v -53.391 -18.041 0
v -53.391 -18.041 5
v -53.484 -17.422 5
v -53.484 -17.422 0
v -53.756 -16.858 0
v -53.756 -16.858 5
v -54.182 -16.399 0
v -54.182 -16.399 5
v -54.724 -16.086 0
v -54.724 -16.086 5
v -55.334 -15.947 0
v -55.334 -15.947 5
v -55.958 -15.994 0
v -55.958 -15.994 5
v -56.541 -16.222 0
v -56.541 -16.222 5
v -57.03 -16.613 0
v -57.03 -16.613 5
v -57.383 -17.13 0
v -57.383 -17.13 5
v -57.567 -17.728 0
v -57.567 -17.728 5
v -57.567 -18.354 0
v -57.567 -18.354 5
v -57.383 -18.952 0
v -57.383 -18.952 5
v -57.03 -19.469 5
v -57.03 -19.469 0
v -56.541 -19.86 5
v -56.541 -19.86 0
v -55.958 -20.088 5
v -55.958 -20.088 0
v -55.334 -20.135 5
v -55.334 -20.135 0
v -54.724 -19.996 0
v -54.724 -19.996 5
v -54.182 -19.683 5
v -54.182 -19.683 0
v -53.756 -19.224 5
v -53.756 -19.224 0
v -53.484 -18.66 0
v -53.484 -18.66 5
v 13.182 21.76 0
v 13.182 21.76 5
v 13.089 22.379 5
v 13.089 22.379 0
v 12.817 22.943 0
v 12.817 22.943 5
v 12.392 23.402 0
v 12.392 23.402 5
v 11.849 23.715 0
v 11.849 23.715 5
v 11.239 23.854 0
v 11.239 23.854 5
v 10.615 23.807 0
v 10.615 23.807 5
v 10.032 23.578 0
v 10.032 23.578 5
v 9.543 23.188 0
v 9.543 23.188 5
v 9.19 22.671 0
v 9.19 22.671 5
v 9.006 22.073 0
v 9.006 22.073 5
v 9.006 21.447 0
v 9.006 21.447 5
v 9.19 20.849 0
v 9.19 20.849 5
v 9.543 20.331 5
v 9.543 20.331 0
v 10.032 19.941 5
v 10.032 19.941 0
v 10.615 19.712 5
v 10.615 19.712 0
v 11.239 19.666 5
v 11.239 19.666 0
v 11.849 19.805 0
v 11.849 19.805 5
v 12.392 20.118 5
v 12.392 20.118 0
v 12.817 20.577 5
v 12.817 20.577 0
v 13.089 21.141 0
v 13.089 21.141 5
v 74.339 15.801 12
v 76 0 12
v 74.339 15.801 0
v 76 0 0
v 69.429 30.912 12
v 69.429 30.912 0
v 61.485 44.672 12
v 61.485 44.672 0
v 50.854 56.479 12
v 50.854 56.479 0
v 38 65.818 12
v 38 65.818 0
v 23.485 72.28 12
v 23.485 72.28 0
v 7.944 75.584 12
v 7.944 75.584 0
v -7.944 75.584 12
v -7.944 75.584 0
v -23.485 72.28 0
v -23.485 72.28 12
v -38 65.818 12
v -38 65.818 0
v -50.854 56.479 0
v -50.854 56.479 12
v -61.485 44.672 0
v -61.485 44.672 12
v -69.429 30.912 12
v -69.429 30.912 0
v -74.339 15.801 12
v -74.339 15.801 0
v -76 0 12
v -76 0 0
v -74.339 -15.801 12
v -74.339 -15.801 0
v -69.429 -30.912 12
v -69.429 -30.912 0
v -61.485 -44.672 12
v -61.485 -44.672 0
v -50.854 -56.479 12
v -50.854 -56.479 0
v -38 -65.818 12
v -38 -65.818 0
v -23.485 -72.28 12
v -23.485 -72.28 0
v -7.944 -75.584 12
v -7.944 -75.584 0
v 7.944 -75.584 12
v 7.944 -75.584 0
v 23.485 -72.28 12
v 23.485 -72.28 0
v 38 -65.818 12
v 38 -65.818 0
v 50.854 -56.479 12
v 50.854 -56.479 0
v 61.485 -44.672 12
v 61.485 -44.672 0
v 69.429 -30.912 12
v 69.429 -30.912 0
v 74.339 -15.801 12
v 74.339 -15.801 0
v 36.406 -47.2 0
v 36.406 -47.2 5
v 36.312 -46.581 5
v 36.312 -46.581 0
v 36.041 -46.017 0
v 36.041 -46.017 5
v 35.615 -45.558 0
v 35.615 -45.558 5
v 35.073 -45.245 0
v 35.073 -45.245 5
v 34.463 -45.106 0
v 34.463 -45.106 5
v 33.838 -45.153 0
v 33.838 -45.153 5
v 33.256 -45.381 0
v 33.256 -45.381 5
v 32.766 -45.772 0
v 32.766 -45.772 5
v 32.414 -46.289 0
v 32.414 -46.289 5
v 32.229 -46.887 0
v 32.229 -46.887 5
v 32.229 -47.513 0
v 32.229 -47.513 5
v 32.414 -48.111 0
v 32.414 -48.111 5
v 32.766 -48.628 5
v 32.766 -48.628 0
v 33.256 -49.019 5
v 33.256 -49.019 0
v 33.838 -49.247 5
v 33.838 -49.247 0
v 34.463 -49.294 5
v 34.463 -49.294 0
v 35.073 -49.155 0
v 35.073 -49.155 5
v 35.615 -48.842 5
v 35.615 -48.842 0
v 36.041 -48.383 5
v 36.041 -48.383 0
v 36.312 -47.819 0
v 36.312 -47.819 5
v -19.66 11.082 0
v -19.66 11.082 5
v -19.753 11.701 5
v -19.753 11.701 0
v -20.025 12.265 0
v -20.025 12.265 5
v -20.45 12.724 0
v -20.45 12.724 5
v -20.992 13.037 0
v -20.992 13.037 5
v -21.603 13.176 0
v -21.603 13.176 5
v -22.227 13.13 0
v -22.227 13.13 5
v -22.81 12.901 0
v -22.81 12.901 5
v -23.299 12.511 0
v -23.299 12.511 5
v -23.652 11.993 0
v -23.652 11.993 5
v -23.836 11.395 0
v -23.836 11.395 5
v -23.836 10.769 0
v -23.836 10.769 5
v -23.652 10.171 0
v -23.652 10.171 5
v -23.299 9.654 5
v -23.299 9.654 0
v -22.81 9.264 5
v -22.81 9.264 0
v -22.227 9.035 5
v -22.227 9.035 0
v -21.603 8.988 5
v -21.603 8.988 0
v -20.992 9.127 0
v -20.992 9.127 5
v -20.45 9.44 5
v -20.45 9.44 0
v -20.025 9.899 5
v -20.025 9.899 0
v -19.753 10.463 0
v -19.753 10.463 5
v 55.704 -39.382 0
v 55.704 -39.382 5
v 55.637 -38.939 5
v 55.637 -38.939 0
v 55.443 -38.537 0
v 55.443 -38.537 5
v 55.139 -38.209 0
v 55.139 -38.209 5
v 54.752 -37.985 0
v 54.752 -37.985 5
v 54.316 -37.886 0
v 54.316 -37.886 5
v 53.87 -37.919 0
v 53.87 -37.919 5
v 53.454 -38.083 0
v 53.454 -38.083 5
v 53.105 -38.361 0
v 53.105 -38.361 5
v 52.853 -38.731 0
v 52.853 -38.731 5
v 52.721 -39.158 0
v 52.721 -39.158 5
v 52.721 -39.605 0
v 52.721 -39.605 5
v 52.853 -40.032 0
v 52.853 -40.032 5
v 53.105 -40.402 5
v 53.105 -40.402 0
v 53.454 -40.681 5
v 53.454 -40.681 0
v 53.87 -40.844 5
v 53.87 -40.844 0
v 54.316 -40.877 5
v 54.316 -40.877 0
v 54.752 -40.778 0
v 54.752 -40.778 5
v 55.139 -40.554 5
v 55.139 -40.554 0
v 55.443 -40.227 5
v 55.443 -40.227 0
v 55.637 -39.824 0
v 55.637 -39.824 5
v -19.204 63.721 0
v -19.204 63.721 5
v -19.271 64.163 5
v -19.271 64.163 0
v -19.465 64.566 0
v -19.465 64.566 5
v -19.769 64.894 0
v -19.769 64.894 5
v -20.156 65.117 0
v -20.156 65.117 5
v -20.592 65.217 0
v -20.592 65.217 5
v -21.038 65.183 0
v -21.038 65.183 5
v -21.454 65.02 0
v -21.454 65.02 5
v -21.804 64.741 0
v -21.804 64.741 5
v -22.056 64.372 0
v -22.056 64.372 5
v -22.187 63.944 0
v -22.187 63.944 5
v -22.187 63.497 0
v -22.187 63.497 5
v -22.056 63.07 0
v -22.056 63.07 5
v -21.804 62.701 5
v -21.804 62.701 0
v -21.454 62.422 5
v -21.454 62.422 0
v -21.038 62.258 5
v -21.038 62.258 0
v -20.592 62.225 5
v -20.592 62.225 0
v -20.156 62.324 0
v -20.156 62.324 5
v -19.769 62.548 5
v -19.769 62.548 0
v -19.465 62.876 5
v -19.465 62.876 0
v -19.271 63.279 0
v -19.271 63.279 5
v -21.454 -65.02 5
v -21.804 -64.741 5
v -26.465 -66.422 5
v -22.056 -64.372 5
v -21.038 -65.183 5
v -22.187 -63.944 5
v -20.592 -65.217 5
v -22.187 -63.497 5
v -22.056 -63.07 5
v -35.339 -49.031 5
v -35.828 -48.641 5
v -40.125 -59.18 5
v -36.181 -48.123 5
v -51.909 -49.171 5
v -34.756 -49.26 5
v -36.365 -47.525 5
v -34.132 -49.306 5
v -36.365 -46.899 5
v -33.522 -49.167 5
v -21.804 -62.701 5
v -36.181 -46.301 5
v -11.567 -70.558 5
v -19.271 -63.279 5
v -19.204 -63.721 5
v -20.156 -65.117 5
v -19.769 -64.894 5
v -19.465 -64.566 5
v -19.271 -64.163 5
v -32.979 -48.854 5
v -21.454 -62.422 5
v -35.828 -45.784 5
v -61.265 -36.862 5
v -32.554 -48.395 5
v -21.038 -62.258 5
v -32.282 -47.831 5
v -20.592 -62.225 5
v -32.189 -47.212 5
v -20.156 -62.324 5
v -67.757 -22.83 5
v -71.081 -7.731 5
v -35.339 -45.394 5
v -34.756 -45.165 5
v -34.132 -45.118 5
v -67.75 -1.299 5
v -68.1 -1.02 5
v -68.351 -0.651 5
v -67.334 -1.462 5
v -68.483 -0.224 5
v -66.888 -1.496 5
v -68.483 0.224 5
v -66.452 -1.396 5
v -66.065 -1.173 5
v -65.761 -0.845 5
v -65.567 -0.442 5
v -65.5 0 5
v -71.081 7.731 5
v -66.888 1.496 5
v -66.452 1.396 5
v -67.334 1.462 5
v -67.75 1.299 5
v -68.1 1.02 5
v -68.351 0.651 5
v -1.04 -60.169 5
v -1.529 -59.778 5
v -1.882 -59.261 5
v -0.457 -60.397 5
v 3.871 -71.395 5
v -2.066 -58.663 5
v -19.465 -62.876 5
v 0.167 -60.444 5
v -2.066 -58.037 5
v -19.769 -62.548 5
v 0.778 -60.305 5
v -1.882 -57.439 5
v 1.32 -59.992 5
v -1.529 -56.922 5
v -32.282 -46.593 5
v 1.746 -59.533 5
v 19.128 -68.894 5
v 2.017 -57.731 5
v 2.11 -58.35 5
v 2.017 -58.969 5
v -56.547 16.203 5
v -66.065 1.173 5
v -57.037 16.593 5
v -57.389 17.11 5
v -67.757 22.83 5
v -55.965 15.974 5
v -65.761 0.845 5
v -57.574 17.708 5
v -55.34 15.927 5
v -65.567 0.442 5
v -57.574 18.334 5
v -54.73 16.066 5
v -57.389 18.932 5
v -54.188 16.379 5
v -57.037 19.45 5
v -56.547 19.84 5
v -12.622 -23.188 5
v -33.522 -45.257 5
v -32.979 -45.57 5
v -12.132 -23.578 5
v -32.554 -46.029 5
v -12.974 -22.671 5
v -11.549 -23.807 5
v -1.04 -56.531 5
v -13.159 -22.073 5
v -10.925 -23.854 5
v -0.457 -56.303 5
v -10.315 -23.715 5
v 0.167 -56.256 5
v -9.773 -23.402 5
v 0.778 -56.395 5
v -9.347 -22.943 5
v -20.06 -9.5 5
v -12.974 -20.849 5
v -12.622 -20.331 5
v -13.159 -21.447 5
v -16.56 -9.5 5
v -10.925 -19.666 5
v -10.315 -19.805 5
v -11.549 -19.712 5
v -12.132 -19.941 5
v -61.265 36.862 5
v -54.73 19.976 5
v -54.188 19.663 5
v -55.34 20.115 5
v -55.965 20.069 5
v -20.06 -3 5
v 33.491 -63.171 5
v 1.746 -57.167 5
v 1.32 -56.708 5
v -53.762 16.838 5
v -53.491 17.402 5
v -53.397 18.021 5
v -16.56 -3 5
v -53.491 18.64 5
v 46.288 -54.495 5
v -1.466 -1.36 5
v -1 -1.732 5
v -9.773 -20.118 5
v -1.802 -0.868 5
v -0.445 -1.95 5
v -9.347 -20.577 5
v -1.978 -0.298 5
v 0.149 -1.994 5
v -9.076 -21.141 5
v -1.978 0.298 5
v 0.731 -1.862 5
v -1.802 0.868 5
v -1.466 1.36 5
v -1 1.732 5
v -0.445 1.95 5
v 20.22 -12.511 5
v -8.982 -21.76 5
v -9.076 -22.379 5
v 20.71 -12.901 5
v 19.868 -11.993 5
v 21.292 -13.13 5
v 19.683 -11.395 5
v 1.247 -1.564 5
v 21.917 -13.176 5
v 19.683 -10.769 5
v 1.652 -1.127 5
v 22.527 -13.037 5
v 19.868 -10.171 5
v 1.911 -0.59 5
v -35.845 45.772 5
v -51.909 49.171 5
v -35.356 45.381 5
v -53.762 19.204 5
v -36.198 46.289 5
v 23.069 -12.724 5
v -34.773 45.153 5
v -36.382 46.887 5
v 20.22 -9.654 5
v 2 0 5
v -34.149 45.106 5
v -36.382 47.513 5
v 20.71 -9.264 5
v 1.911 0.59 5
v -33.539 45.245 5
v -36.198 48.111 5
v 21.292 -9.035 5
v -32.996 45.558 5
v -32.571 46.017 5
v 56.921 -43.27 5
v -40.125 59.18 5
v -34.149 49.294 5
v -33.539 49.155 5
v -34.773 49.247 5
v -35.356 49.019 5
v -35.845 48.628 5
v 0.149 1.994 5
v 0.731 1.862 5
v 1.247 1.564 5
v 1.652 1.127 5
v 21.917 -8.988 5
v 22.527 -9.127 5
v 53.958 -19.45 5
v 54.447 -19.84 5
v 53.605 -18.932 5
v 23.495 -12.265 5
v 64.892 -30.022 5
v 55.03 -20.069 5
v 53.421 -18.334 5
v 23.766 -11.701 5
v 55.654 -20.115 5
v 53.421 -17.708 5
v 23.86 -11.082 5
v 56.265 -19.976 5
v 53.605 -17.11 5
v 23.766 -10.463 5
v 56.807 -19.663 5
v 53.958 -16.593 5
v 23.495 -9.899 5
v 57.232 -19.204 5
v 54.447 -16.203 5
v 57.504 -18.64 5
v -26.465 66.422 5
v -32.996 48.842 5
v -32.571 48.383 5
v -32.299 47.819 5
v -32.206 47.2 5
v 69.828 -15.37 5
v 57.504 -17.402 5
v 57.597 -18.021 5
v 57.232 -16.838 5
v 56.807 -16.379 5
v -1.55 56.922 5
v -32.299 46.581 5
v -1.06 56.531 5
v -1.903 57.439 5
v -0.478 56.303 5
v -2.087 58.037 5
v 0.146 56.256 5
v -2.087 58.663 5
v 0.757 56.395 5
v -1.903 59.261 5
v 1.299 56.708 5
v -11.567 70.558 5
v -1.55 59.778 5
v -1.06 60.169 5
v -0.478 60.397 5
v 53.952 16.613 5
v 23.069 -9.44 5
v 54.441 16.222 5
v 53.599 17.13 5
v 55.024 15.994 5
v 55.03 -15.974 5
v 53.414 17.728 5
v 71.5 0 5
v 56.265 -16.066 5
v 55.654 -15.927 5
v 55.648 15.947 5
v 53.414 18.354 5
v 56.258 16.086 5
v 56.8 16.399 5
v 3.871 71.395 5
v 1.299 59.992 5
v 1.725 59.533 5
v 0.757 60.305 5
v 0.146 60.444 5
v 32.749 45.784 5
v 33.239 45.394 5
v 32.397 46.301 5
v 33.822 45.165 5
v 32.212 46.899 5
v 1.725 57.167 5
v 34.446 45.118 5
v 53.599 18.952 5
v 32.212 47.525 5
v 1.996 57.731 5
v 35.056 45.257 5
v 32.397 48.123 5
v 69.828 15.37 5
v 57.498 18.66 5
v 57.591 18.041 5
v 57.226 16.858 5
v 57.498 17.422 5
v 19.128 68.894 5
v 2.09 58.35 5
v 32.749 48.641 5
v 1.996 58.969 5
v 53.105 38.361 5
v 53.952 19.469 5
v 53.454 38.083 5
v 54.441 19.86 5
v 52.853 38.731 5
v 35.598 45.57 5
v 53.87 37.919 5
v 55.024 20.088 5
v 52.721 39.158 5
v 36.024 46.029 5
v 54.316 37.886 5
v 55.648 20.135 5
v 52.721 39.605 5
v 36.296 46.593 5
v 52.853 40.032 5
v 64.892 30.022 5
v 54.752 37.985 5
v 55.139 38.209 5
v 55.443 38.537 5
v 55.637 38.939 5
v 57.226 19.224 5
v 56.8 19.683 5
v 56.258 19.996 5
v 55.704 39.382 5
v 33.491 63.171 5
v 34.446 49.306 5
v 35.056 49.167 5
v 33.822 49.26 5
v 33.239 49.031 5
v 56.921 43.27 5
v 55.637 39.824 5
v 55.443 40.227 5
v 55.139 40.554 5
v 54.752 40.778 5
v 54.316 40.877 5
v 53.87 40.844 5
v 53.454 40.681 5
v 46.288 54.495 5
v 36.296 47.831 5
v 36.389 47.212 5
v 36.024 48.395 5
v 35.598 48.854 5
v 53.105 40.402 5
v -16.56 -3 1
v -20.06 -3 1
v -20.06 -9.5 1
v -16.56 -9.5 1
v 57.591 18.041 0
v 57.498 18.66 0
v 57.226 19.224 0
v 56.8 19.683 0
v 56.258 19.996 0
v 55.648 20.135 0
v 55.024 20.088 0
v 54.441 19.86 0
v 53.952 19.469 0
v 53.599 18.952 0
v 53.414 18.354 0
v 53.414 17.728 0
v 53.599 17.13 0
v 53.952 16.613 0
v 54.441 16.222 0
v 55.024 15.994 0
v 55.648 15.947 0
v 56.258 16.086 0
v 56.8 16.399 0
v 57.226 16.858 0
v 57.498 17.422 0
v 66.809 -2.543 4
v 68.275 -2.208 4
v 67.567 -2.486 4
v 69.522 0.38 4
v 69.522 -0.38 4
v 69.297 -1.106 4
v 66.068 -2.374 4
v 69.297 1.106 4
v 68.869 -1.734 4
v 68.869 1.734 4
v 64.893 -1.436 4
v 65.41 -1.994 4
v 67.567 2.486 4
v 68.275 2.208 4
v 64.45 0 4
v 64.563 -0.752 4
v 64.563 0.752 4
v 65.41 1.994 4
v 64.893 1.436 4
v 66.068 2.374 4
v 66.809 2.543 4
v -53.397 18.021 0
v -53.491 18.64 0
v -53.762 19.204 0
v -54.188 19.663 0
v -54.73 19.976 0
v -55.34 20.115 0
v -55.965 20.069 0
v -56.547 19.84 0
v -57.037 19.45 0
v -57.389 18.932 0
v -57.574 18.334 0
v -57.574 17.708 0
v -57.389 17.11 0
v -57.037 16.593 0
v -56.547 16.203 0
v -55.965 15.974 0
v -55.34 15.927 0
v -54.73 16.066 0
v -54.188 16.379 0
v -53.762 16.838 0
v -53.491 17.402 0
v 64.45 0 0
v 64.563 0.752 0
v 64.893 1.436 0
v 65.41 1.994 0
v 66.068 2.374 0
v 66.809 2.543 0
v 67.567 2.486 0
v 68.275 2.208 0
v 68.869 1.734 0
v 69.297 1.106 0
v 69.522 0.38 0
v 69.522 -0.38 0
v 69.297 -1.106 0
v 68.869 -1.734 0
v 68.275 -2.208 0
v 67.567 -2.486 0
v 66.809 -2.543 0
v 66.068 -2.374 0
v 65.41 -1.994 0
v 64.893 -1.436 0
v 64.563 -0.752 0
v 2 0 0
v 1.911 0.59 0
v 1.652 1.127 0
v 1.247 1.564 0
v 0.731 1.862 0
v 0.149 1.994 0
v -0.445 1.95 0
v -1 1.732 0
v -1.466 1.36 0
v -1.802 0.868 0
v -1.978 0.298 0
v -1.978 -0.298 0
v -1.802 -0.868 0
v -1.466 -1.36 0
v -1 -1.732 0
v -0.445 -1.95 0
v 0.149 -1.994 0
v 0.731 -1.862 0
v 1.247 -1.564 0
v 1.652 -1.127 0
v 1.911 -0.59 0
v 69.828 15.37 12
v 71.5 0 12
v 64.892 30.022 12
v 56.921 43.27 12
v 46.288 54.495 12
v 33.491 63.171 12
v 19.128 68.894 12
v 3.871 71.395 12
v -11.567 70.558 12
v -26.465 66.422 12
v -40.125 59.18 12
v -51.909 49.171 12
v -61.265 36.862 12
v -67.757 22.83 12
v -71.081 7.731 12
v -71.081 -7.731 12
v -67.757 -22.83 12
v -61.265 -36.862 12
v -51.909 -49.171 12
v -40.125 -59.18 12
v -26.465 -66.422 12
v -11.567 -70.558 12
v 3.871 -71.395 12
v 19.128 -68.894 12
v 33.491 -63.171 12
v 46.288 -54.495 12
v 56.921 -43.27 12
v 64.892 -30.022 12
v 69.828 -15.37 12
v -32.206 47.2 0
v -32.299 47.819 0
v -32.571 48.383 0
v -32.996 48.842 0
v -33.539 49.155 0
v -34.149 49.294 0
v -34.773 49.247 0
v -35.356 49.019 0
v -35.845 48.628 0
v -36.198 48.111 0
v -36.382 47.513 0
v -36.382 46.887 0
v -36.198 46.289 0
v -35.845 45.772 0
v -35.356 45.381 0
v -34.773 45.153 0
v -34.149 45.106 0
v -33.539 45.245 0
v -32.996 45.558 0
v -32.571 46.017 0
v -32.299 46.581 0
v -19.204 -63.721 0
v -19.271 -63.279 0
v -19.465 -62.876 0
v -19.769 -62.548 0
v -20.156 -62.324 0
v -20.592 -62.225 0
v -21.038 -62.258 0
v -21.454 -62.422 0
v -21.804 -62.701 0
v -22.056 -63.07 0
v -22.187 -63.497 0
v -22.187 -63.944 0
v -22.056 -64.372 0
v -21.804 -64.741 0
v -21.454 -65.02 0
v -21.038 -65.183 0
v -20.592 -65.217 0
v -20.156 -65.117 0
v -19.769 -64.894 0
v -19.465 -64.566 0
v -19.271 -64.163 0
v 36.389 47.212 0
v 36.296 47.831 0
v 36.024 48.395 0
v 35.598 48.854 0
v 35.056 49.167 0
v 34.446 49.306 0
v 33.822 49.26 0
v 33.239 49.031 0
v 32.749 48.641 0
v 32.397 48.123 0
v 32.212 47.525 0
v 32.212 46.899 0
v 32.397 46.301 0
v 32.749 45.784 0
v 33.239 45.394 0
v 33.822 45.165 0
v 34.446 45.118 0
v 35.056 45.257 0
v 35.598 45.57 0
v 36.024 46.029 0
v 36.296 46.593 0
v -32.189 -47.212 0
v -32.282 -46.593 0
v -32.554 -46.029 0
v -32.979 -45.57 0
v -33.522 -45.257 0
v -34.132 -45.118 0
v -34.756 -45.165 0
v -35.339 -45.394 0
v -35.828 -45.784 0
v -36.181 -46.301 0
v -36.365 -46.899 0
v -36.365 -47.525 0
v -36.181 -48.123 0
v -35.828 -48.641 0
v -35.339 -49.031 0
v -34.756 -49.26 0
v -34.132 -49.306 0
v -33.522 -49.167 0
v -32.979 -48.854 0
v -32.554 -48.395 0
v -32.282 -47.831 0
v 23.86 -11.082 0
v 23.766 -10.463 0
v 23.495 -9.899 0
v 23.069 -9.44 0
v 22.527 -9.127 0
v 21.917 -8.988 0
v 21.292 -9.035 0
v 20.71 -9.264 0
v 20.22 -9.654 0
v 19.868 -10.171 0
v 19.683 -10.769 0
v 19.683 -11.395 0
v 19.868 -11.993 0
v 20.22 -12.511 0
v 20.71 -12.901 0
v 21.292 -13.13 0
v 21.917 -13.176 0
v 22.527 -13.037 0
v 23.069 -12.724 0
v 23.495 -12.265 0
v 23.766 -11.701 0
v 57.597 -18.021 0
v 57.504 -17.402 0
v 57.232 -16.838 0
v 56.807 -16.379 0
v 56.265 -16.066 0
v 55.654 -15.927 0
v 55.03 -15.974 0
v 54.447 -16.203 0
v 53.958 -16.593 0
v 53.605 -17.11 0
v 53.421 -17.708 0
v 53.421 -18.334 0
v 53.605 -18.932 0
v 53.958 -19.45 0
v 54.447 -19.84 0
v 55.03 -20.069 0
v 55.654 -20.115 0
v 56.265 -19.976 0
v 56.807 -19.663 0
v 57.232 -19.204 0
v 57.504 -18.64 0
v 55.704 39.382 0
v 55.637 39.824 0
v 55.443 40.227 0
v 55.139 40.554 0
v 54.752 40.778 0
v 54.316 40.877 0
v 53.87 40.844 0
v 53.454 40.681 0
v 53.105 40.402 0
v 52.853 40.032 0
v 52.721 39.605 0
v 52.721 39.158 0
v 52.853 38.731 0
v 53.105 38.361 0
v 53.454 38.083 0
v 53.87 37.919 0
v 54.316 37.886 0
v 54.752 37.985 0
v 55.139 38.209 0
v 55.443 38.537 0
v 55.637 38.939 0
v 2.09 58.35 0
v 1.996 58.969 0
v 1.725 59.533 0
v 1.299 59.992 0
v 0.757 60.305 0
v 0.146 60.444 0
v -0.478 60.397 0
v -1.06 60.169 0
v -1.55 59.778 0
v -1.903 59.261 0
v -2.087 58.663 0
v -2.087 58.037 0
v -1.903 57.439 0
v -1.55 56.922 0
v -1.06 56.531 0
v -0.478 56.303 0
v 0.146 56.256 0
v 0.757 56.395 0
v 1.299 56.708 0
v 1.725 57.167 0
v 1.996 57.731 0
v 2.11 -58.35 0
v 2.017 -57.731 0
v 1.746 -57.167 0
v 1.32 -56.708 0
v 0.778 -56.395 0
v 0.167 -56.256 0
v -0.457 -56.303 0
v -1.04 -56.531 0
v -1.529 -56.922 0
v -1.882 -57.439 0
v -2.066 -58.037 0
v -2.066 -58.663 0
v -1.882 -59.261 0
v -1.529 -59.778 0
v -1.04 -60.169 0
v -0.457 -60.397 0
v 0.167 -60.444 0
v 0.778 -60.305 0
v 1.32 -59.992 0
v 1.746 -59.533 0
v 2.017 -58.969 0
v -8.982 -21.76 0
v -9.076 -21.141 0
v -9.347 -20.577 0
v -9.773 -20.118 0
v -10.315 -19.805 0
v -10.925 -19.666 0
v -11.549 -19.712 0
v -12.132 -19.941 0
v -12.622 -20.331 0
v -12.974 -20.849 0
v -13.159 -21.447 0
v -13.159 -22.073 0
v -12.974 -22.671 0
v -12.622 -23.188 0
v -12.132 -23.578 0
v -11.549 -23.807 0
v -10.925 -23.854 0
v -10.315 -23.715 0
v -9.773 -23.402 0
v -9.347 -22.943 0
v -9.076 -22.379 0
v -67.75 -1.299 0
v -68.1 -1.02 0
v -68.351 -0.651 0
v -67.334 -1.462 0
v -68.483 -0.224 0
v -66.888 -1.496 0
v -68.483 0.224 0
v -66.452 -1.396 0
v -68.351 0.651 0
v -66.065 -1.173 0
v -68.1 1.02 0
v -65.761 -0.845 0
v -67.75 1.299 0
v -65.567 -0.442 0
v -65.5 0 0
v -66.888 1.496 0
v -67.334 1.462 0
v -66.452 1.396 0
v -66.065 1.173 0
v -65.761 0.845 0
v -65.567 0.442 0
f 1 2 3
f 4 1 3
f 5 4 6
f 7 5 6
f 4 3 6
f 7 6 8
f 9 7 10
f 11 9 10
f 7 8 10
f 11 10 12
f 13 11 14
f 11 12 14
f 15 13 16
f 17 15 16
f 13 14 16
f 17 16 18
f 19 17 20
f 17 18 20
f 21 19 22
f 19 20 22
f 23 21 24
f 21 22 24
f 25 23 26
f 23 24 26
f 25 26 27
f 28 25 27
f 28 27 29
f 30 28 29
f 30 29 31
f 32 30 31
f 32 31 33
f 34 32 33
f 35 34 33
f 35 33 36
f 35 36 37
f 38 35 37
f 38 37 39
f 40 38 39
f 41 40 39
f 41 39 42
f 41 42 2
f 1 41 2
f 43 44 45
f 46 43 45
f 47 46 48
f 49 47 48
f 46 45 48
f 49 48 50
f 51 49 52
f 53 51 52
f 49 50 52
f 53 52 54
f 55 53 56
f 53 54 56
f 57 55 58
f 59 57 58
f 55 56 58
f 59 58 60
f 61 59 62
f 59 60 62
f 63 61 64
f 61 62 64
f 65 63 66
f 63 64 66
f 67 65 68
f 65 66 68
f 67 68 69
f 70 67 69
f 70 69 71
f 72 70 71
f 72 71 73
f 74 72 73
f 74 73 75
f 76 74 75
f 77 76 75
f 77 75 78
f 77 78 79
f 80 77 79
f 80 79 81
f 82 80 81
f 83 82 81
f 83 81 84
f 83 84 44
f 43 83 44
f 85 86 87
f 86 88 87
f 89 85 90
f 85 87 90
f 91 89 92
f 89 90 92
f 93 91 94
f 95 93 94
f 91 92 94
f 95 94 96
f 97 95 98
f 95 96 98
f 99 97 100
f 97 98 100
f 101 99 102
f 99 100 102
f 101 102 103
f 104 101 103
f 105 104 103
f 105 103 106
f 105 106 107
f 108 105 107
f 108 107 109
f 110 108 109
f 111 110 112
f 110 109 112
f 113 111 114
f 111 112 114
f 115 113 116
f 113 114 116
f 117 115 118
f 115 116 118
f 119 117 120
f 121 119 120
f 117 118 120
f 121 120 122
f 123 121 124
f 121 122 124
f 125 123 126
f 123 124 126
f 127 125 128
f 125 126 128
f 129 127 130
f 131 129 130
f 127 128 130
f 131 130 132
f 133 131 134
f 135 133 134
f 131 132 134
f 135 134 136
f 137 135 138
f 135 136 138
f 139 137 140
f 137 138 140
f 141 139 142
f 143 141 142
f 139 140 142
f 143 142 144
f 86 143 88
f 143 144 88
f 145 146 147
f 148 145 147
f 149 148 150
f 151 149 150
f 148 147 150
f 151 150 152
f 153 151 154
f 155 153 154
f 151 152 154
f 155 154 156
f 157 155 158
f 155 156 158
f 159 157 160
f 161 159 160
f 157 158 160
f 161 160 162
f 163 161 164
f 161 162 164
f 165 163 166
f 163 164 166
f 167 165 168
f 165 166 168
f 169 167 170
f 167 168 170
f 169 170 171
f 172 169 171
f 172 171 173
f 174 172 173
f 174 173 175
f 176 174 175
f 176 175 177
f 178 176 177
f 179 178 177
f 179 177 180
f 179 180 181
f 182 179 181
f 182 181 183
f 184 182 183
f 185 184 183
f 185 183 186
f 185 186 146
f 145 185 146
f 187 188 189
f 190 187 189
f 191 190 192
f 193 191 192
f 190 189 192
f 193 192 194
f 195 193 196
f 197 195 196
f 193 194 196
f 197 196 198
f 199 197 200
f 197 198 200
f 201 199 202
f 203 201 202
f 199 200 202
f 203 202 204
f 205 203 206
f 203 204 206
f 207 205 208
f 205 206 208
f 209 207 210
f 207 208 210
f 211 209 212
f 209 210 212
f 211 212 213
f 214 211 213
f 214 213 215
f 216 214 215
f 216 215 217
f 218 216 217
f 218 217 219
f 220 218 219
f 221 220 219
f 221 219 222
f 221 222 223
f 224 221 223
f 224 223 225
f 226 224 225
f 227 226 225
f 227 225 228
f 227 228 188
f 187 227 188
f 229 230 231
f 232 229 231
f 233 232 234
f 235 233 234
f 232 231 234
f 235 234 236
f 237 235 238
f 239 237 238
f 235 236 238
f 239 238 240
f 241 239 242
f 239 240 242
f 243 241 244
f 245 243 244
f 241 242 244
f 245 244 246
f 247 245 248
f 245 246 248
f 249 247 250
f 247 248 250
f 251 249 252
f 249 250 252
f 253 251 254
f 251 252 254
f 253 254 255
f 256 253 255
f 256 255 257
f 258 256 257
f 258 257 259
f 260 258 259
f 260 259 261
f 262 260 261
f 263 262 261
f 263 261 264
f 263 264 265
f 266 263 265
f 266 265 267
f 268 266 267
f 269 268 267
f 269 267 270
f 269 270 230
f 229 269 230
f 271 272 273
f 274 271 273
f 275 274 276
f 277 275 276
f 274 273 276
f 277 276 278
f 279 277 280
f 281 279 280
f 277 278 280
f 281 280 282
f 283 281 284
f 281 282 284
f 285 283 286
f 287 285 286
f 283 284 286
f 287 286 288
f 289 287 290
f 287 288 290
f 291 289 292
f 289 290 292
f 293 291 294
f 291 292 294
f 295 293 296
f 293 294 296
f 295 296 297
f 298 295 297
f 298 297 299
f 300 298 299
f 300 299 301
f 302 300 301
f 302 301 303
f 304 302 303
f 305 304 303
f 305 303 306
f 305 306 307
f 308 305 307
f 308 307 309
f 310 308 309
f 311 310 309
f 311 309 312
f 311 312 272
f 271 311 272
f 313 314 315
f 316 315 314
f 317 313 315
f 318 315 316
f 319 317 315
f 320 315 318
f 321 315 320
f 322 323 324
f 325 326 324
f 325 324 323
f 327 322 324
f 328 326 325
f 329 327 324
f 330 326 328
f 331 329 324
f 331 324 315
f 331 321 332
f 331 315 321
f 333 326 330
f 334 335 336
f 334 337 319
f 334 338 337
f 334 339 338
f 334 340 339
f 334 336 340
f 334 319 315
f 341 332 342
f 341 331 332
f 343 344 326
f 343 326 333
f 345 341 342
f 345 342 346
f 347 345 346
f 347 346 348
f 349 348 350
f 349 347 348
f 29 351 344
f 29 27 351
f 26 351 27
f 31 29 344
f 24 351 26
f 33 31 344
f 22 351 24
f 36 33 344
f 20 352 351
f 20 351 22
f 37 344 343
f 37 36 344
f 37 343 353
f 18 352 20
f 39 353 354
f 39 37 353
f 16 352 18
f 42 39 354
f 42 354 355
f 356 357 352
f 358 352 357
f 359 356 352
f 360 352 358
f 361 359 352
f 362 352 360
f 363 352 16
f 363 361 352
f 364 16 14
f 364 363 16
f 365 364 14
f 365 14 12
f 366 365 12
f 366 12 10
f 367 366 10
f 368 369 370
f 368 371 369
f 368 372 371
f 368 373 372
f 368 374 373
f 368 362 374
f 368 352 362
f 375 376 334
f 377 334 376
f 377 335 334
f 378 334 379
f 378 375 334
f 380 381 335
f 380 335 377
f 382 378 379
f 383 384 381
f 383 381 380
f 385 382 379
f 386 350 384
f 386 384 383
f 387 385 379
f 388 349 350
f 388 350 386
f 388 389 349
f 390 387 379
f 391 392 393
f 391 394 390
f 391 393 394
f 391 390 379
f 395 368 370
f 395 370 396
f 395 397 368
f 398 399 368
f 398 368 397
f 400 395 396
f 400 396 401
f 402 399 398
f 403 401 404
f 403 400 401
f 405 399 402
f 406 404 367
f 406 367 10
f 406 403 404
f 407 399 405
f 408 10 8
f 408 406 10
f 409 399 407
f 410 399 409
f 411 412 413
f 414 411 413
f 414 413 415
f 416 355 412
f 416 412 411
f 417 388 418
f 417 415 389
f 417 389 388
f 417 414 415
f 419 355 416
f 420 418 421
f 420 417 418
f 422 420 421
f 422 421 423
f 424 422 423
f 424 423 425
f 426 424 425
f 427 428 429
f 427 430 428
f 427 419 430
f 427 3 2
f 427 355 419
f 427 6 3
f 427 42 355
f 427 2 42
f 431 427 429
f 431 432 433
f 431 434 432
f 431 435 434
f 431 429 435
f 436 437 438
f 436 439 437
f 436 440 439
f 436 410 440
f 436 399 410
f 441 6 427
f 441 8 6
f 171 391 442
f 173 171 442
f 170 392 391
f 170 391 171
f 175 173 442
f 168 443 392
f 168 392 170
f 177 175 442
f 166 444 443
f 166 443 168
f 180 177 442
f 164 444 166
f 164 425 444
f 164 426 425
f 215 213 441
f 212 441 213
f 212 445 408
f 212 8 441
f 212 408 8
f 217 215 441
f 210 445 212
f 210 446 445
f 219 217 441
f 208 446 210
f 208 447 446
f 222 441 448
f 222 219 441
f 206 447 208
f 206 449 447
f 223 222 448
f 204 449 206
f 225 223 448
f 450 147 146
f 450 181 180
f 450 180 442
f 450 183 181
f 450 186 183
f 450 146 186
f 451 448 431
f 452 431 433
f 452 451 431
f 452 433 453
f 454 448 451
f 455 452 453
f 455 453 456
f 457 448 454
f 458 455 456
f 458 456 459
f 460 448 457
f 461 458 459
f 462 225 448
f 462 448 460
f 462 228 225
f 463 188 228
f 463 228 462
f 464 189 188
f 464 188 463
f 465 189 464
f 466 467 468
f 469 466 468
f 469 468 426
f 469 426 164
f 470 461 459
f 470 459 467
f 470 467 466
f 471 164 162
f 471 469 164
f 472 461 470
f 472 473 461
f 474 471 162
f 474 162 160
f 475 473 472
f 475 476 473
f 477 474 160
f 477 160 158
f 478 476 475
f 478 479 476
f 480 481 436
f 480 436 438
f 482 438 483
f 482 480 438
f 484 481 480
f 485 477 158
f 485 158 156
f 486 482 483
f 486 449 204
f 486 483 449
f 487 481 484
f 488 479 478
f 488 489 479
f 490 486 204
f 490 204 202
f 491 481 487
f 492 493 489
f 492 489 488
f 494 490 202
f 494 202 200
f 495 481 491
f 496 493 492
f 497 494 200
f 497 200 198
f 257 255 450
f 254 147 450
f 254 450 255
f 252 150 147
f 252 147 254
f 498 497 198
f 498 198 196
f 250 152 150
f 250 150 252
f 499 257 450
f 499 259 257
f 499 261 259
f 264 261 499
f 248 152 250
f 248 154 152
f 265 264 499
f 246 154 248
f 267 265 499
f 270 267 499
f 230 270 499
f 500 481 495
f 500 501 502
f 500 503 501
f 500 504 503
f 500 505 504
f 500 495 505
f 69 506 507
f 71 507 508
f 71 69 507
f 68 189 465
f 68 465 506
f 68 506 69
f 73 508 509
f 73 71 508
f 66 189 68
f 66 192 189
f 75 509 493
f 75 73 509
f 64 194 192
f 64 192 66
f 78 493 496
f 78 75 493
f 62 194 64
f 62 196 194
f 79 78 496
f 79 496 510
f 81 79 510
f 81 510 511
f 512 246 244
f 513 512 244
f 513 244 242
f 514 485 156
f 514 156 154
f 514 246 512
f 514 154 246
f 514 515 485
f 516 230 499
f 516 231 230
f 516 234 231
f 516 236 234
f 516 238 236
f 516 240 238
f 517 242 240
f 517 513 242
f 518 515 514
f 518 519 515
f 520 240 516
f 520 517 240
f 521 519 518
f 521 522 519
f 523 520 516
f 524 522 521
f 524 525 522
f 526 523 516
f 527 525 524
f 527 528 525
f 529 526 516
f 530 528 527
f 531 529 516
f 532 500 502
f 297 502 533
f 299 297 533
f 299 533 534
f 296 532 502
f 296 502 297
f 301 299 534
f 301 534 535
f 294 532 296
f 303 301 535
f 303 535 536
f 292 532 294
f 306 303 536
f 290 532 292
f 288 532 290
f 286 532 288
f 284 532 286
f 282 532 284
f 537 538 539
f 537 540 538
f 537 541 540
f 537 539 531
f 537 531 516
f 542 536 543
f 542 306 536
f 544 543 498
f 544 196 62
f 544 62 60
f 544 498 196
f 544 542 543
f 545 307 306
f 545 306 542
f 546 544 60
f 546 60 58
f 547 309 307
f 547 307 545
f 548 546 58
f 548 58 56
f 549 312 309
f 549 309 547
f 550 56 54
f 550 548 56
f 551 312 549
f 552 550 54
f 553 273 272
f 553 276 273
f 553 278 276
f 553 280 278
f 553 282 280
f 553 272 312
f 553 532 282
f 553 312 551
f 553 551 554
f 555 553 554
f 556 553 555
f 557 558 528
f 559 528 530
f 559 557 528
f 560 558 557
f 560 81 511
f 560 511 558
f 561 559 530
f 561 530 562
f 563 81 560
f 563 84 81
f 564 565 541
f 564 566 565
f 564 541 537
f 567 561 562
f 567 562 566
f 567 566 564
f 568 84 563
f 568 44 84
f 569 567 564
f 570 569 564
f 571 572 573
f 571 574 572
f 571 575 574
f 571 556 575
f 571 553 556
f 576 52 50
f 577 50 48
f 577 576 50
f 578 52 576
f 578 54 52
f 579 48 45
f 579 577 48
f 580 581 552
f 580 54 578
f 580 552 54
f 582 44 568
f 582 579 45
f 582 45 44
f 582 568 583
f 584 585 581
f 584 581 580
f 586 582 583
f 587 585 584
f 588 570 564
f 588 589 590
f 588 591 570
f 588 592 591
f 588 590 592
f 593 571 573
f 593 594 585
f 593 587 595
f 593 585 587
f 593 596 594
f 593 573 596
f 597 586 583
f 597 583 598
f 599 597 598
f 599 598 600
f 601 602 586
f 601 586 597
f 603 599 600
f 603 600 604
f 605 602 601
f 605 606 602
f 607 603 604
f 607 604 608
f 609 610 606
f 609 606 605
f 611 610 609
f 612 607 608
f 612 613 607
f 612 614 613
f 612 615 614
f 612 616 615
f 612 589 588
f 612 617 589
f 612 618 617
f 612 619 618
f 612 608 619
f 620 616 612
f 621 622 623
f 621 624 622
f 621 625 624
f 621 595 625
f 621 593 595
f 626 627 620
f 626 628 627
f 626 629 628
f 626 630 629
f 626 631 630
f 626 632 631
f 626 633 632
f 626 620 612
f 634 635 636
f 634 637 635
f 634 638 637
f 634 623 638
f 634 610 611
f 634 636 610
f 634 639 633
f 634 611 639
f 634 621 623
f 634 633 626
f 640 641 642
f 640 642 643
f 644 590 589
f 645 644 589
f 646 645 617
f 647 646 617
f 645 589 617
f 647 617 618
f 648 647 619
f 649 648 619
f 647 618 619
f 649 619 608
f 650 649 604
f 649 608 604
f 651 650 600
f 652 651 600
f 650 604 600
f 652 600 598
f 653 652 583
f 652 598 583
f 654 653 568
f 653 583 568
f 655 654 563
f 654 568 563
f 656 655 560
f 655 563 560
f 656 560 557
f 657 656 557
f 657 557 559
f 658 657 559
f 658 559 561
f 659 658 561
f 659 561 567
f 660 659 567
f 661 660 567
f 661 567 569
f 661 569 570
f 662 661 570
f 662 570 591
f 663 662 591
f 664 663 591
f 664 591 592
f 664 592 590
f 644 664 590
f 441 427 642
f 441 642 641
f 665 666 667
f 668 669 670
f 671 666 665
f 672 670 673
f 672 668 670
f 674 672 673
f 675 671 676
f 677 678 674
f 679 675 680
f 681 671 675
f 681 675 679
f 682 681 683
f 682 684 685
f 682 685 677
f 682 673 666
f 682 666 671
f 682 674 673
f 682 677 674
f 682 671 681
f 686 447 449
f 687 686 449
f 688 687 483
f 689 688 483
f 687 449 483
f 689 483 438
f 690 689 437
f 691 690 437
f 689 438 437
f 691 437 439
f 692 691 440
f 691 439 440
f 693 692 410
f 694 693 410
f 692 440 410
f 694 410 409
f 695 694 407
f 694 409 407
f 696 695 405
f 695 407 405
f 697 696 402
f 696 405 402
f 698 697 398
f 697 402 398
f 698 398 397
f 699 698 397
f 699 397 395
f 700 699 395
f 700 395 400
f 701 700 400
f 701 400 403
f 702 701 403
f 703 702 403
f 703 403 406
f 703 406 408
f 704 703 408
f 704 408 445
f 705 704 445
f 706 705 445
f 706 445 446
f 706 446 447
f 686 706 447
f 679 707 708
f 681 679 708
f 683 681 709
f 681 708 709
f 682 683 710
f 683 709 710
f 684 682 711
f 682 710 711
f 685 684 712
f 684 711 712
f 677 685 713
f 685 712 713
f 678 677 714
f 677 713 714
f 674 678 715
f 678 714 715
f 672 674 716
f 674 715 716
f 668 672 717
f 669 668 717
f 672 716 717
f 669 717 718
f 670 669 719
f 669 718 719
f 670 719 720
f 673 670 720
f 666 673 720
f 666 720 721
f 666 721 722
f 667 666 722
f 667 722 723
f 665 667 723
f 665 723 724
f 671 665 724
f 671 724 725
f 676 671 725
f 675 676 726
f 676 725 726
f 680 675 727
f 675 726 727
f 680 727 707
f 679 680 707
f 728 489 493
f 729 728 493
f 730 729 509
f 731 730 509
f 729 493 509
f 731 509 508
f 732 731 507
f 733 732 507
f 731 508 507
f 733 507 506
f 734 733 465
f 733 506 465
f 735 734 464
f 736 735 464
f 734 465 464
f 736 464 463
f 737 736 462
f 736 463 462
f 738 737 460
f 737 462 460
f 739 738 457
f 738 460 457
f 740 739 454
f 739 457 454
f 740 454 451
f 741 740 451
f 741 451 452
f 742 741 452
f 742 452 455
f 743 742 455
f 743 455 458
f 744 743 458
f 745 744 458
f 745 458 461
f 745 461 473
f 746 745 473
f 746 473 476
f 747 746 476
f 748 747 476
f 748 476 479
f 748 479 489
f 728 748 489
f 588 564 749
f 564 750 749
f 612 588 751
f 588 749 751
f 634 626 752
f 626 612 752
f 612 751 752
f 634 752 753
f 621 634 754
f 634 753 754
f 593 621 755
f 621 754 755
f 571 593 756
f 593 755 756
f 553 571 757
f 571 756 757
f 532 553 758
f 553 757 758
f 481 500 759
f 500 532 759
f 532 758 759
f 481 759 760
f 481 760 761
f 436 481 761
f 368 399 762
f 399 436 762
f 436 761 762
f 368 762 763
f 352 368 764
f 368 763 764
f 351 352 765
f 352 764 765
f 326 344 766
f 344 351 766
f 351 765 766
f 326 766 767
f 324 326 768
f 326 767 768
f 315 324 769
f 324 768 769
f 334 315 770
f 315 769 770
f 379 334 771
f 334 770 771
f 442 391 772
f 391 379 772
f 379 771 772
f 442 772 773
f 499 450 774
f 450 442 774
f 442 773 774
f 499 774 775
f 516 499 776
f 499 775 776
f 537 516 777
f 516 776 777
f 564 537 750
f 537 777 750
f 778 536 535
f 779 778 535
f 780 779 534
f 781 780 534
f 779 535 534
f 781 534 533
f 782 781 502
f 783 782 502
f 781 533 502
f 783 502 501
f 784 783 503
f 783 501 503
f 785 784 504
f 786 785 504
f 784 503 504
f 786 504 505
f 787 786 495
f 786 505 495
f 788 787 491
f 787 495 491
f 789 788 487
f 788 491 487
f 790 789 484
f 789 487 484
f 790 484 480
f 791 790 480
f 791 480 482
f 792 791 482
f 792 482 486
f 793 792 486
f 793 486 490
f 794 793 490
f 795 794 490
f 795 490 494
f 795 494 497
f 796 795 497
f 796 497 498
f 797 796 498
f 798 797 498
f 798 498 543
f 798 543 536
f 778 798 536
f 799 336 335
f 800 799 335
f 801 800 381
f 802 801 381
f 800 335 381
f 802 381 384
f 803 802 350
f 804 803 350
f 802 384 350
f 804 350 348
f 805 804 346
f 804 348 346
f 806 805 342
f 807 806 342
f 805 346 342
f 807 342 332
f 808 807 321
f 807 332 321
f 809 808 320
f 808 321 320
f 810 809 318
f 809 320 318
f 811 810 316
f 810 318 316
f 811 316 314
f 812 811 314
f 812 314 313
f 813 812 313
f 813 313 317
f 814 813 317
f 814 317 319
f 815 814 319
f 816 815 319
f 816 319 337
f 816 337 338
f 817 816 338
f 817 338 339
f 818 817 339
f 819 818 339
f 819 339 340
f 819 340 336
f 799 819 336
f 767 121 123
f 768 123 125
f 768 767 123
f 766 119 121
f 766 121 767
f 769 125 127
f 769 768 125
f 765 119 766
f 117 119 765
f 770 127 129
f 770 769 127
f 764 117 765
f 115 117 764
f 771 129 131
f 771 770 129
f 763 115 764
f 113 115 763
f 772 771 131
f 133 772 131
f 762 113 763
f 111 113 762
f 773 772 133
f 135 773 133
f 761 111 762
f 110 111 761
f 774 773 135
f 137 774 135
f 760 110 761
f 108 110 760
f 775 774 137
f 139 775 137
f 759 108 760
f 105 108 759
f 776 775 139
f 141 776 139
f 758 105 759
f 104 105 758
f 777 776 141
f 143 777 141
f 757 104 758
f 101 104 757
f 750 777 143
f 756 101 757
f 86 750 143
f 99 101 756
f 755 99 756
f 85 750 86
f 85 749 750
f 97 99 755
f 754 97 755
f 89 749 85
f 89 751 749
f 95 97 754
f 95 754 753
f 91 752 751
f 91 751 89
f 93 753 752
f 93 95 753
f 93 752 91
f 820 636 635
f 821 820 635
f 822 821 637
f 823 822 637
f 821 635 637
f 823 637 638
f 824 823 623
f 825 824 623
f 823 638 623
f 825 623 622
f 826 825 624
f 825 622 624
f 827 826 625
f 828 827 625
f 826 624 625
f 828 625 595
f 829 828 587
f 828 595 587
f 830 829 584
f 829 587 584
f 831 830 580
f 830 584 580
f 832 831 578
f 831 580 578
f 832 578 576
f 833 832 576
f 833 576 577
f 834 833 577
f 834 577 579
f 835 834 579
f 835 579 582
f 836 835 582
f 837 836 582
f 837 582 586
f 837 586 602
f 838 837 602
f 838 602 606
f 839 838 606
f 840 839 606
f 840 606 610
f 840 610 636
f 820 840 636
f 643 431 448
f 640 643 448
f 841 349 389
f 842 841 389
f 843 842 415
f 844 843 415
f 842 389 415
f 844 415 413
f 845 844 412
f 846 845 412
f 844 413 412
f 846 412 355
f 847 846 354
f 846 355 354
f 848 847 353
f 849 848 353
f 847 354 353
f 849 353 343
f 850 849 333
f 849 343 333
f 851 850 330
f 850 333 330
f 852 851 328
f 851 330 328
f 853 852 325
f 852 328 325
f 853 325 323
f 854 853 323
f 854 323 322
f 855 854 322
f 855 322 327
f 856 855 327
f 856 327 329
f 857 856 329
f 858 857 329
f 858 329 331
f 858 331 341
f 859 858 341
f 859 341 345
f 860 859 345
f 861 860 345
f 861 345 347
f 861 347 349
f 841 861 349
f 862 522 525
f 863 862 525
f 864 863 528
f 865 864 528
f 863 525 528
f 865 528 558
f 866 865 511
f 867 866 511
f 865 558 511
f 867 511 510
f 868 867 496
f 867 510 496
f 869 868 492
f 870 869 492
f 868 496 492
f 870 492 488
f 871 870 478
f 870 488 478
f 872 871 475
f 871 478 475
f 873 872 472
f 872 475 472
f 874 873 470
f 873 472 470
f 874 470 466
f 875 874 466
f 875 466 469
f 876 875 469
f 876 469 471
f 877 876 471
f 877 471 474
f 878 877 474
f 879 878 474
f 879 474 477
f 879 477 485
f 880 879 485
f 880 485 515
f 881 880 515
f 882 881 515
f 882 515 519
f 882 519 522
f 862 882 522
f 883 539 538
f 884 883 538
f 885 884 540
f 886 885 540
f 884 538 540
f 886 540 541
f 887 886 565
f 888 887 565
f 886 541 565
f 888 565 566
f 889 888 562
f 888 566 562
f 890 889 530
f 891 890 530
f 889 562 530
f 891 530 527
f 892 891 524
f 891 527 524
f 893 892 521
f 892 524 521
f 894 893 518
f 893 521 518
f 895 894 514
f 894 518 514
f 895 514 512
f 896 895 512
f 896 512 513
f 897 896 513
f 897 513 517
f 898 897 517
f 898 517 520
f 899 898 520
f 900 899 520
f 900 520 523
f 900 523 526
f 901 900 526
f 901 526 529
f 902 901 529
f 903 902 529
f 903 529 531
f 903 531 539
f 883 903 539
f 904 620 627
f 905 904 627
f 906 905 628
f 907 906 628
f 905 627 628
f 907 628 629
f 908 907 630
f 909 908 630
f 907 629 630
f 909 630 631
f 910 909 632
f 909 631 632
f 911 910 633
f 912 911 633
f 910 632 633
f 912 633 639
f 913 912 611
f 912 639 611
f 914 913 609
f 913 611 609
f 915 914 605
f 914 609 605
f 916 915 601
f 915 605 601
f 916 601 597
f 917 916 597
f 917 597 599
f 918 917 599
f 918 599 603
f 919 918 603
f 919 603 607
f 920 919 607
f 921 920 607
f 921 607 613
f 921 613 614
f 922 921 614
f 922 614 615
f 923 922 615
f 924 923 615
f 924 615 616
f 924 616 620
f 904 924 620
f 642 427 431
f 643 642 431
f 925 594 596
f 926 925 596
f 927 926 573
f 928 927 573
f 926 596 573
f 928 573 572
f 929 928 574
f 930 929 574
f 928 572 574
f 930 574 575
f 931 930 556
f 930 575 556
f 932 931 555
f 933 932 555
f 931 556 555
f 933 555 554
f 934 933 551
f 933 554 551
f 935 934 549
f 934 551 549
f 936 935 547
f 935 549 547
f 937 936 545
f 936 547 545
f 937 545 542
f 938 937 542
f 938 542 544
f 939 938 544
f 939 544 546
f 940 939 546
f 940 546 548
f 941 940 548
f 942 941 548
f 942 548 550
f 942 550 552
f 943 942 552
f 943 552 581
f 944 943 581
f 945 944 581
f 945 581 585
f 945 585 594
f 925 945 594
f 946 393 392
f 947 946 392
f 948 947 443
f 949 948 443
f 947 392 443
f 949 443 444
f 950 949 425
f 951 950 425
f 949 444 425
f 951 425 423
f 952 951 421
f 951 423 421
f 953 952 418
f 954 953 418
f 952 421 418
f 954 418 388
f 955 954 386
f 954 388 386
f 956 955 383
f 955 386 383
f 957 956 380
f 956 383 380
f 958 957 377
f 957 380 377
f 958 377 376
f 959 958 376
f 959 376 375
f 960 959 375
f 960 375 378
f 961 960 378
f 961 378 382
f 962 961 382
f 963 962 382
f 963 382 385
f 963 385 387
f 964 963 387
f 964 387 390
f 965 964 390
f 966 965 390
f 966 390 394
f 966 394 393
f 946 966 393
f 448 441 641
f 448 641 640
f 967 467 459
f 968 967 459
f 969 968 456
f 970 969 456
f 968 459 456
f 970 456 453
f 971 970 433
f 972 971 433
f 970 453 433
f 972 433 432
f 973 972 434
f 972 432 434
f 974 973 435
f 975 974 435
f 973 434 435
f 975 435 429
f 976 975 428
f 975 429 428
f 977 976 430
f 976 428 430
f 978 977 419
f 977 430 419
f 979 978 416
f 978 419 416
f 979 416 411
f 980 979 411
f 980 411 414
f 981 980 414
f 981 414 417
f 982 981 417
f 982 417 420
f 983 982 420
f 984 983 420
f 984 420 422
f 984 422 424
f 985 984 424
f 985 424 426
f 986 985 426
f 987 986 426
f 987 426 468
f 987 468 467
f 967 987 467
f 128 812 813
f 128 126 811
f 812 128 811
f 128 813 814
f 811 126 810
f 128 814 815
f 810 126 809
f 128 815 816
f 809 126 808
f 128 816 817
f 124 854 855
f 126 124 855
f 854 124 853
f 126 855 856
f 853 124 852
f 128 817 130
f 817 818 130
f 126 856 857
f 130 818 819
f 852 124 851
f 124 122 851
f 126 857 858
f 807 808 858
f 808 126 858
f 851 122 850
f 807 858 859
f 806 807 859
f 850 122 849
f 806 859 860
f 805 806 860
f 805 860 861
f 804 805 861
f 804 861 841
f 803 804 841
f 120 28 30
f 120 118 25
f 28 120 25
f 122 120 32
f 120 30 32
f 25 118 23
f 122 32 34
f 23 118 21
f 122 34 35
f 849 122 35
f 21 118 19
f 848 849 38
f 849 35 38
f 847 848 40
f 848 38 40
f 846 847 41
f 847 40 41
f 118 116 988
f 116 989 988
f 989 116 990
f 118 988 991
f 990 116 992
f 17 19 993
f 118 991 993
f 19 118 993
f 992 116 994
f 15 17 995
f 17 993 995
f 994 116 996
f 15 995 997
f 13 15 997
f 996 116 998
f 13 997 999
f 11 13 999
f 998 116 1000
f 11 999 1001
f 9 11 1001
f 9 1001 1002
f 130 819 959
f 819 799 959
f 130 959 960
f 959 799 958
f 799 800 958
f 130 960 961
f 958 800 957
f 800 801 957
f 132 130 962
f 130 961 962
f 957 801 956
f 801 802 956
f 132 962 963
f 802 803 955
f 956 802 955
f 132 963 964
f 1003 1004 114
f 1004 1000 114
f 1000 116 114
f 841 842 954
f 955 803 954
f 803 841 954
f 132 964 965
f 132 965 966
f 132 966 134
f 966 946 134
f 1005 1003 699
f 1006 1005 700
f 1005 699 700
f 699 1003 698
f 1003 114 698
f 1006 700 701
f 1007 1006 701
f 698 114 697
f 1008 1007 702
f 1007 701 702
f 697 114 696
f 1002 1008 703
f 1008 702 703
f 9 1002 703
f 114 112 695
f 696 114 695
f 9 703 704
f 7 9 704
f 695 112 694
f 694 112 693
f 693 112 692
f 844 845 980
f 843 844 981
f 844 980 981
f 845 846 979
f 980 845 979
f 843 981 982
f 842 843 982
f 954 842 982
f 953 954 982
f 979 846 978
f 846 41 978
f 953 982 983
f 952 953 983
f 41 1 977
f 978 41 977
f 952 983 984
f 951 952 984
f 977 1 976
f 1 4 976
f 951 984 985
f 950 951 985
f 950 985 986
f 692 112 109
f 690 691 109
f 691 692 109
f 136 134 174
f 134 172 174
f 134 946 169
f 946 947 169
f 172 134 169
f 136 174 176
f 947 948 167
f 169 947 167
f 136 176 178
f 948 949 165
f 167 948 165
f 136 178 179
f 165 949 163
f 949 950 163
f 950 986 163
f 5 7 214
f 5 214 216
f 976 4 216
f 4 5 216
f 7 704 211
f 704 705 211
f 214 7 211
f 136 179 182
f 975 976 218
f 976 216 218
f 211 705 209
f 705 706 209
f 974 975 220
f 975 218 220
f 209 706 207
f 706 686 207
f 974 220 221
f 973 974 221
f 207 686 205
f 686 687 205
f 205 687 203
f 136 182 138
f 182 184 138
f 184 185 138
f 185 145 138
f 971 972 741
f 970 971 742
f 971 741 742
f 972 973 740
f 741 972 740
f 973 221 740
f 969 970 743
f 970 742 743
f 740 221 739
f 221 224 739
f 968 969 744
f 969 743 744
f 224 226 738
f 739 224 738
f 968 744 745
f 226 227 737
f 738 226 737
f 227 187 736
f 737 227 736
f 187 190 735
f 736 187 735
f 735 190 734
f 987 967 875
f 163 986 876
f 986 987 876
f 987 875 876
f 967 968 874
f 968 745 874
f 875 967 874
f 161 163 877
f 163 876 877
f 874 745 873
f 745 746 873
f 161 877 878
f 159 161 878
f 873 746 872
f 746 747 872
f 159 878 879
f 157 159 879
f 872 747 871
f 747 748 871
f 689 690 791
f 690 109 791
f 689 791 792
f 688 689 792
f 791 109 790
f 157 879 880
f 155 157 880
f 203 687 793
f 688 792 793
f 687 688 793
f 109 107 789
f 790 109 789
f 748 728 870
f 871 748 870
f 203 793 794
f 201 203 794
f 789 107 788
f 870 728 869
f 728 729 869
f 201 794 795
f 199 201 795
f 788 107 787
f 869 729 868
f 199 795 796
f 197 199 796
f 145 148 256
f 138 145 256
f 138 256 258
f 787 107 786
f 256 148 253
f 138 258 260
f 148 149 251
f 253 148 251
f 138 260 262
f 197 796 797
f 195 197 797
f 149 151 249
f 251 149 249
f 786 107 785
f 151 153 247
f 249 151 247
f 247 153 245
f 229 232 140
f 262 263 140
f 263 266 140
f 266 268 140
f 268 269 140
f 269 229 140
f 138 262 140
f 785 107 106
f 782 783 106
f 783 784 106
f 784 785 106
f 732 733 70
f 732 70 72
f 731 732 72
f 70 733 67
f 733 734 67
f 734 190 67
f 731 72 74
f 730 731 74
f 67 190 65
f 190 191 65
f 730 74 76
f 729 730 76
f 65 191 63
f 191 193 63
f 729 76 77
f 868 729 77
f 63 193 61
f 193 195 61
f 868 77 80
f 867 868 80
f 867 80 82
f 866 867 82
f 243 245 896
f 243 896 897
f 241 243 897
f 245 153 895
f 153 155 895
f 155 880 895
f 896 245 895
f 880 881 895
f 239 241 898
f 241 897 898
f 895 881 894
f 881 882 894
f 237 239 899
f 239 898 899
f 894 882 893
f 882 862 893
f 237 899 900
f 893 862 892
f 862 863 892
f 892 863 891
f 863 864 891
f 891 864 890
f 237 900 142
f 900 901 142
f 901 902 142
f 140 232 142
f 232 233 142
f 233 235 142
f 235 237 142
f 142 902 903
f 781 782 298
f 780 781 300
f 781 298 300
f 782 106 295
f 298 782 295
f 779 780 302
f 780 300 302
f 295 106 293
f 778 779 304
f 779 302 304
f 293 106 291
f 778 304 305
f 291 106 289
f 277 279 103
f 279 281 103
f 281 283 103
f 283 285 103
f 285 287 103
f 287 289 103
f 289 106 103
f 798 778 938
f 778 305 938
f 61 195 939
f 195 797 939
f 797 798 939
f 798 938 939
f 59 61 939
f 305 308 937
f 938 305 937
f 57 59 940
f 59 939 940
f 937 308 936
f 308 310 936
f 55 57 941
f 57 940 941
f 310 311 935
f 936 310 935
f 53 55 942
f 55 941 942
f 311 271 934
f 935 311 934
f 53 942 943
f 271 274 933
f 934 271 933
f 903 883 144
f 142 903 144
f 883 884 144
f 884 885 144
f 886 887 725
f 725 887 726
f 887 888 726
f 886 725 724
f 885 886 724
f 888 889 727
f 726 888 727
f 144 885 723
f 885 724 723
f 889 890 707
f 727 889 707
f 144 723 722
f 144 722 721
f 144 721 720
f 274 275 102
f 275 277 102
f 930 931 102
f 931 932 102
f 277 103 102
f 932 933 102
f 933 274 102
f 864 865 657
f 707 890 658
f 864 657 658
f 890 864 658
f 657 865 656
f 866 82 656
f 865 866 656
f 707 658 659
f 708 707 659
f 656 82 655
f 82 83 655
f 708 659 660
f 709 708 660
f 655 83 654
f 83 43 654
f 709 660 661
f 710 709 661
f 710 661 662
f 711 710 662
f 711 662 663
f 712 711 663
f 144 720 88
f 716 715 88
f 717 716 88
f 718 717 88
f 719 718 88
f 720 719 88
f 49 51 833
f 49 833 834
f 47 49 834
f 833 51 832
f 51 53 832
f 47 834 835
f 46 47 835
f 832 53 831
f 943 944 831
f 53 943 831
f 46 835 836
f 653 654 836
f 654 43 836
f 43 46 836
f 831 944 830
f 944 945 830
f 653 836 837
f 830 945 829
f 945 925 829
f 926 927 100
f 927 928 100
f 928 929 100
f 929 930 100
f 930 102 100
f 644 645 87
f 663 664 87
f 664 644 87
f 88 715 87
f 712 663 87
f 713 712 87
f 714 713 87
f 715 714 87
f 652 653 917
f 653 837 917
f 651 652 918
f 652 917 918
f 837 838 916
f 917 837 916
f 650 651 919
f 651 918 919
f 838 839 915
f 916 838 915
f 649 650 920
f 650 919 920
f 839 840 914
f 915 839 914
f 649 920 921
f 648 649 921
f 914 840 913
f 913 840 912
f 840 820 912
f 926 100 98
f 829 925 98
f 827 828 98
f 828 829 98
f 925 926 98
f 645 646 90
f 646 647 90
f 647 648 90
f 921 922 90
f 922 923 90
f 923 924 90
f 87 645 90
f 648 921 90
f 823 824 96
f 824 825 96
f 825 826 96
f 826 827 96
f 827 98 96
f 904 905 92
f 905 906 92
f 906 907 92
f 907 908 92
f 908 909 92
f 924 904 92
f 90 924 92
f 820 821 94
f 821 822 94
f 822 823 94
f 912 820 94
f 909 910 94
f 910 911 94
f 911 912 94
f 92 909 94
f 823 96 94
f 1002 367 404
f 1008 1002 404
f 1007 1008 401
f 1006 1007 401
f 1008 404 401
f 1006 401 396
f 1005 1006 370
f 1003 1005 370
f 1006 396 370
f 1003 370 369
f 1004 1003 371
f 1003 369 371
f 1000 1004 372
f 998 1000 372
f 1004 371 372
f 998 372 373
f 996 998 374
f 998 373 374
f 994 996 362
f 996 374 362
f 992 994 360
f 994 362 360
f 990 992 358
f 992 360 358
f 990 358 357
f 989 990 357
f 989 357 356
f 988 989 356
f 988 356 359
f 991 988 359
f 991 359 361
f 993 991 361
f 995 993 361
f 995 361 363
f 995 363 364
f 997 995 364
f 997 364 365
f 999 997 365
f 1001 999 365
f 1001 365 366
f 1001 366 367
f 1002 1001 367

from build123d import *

# Parameters (mm, degrees)
ESQUISSE1_R             = 76
BOSS_EXTRU_1_DEPTH      = 5
ESQUISSE2_R             = 2.1
ENL_V_MAT_EXTRU_1_DEPTH = 10
ESQUISSE4_R             = 1.5
ESQUISSE4_R_2           = 2
ENL_V_MAT_EXTRU_2_DEPTH = 10
ESQUISSE5_R             = 76
ESQUISSE5_R_2           = 68.5
BOSS_EXTRU_2_DEPTH      = 7
ESQUISSE6_R             = 4.5
ENL_V_MAT_EXTRU_3_DEPTH = 7
ESQUISSE7_R             = 71.5
ENL_V_MAT_EXTRU_4_DEPTH = 7
ESQUISSE8_W             = 3.5
ESQUISSE8_H             = 6.5
ENL_V_MAT_EXTRU_5_DEPTH = 4
ESQUISSE10_R            = 2.55
ENL_V_MAT_EXTRU_6_DEPTH = 4


with BuildPart() as part:
    # Esquisse1 → Boss.-Extru.1 (new body)
    with BuildSketch(Plane.XY):
        Circle(ESQUISSE1_R)
    extrude(amount=BOSS_EXTRU_1_DEPTH)

    # Esquisse2 → Enlèv. mat.-Extru.1 (cut)
    with BuildSketch(Plane.XY.offset(5)):
        with Locations((-55.497382355, 18.021183418)):
            Circle(ESQUISSE2_R)
        with Locations((-34.305739626, 47.199986533)):
            Circle(ESQUISSE2_R)
        with Locations((-0.010470369, 58.349999061)):
            Circle(ESQUISSE2_R)
        with Locations((34.288798212, 47.212295191)):
            Circle(ESQUISSE2_R)
        with Locations((55.49091131, 18.041099245)):
            Circle(ESQUISSE2_R)
        with Locations((55.497382355, -18.021183418)):
            Circle(ESQUISSE2_R)
        with Locations((34.305739626, -47.199986533)):
            Circle(ESQUISSE2_R)
        with Locations((0.010470369, -58.349999061)):
            Circle(ESQUISSE2_R)
        with Locations((-34.288798212, -47.212295191)):
            Circle(ESQUISSE2_R)
        with Locations((-55.49091131, -18.041099245)):
            Circle(ESQUISSE2_R)
        with Locations((-11.082204515, -21.759702771)):
            Circle(ESQUISSE2_R)
        with Locations((-21.759702771, 11.082204515)):
            Circle(ESQUISSE2_R)
        with Locations((11.082204515, 21.759702771)):
            Circle(ESQUISSE2_R)
        with Locations((21.759702771, -11.082204515)):
            Circle(ESQUISSE2_R)
    extrude(amount=-ENL_V_MAT_EXTRU_1_DEPTH, mode=Mode.SUBTRACT)

    # Esquisse4 → Enlèv. mat.-Extru.2 (cut)
    with BuildSketch(Plane.XY.offset(5)):
        with Locations((-20.704138623, -63.720786592)):
            Circle(ESQUISSE4_R)
        with Locations((-67, 0)):
            Circle(ESQUISSE4_R)
        with Locations((-20.704138623, 63.720786592)):
            Circle(ESQUISSE4_R)
        with Locations((54.204138623, 39.381611904)):
            Circle(ESQUISSE4_R)
        with Locations((54.204138623, -39.381611904)):
            Circle(ESQUISSE4_R)
        Circle(ESQUISSE4_R_2)
    extrude(amount=-ENL_V_MAT_EXTRU_2_DEPTH, mode=Mode.SUBTRACT)

    # Esquisse5 → Boss.-Extru.2 (add)
    with BuildSketch(Plane.XY.offset(5)):
        Circle(ESQUISSE5_R)
        with Locations(Location((0, 0, 0), (0, 0, 179.999985351))):
            Circle(ESQUISSE5_R_2, mode=Mode.SUBTRACT)
    extrude(amount=BOSS_EXTRU_2_DEPTH)

    # Esquisse6 → Enlèv. mat.-Extru.3 (cut)
    with BuildSketch(Plane.XY.offset(12)):
        with Locations((-20.704138623, 63.720786592)):
            Circle(ESQUISSE6_R)
        with Locations((54.204138623, 39.381611904)):
            Circle(ESQUISSE6_R)
        with Locations((54.204138623, -39.381611904)):
            Circle(ESQUISSE6_R)
        with Locations((-20.704138623, -63.720786592)):
            Circle(ESQUISSE6_R)
        with Locations((-67, 0)):
            Circle(ESQUISSE6_R)
    extrude(amount=-ENL_V_MAT_EXTRU_3_DEPTH, mode=Mode.SUBTRACT)

    # Esquisse7 → Enlèv. mat.-Extru.4 (cut)
    with BuildSketch(Plane.XY.offset(12)):
        Circle(ESQUISSE7_R)
    extrude(amount=-ENL_V_MAT_EXTRU_4_DEPTH, mode=Mode.SUBTRACT)

    # Esquisse8 → Enlèv. mat.-Extru.5 (cut)
    with BuildSketch(Plane.XY.offset(5)):
        with Locations((-18.309702771, -6.25)):
            Rectangle(ESQUISSE8_W, ESQUISSE8_H)
    extrude(amount=-ENL_V_MAT_EXTRU_5_DEPTH, mode=Mode.SUBTRACT)

    # Esquisse10 → Enlèv. mat.-Extru.6 (cut)
    with BuildSketch(Plane(origin=(0, 0, 0), x_dir=(-1, 0, 0), z_dir=(0, 0, -1))):
        with Locations((-67, 0)):
            Circle(ESQUISSE10_R)
    extrude(amount=-ENL_V_MAT_EXTRU_6_DEPTH, mode=Mode.SUBTRACT)


solid = part.part
